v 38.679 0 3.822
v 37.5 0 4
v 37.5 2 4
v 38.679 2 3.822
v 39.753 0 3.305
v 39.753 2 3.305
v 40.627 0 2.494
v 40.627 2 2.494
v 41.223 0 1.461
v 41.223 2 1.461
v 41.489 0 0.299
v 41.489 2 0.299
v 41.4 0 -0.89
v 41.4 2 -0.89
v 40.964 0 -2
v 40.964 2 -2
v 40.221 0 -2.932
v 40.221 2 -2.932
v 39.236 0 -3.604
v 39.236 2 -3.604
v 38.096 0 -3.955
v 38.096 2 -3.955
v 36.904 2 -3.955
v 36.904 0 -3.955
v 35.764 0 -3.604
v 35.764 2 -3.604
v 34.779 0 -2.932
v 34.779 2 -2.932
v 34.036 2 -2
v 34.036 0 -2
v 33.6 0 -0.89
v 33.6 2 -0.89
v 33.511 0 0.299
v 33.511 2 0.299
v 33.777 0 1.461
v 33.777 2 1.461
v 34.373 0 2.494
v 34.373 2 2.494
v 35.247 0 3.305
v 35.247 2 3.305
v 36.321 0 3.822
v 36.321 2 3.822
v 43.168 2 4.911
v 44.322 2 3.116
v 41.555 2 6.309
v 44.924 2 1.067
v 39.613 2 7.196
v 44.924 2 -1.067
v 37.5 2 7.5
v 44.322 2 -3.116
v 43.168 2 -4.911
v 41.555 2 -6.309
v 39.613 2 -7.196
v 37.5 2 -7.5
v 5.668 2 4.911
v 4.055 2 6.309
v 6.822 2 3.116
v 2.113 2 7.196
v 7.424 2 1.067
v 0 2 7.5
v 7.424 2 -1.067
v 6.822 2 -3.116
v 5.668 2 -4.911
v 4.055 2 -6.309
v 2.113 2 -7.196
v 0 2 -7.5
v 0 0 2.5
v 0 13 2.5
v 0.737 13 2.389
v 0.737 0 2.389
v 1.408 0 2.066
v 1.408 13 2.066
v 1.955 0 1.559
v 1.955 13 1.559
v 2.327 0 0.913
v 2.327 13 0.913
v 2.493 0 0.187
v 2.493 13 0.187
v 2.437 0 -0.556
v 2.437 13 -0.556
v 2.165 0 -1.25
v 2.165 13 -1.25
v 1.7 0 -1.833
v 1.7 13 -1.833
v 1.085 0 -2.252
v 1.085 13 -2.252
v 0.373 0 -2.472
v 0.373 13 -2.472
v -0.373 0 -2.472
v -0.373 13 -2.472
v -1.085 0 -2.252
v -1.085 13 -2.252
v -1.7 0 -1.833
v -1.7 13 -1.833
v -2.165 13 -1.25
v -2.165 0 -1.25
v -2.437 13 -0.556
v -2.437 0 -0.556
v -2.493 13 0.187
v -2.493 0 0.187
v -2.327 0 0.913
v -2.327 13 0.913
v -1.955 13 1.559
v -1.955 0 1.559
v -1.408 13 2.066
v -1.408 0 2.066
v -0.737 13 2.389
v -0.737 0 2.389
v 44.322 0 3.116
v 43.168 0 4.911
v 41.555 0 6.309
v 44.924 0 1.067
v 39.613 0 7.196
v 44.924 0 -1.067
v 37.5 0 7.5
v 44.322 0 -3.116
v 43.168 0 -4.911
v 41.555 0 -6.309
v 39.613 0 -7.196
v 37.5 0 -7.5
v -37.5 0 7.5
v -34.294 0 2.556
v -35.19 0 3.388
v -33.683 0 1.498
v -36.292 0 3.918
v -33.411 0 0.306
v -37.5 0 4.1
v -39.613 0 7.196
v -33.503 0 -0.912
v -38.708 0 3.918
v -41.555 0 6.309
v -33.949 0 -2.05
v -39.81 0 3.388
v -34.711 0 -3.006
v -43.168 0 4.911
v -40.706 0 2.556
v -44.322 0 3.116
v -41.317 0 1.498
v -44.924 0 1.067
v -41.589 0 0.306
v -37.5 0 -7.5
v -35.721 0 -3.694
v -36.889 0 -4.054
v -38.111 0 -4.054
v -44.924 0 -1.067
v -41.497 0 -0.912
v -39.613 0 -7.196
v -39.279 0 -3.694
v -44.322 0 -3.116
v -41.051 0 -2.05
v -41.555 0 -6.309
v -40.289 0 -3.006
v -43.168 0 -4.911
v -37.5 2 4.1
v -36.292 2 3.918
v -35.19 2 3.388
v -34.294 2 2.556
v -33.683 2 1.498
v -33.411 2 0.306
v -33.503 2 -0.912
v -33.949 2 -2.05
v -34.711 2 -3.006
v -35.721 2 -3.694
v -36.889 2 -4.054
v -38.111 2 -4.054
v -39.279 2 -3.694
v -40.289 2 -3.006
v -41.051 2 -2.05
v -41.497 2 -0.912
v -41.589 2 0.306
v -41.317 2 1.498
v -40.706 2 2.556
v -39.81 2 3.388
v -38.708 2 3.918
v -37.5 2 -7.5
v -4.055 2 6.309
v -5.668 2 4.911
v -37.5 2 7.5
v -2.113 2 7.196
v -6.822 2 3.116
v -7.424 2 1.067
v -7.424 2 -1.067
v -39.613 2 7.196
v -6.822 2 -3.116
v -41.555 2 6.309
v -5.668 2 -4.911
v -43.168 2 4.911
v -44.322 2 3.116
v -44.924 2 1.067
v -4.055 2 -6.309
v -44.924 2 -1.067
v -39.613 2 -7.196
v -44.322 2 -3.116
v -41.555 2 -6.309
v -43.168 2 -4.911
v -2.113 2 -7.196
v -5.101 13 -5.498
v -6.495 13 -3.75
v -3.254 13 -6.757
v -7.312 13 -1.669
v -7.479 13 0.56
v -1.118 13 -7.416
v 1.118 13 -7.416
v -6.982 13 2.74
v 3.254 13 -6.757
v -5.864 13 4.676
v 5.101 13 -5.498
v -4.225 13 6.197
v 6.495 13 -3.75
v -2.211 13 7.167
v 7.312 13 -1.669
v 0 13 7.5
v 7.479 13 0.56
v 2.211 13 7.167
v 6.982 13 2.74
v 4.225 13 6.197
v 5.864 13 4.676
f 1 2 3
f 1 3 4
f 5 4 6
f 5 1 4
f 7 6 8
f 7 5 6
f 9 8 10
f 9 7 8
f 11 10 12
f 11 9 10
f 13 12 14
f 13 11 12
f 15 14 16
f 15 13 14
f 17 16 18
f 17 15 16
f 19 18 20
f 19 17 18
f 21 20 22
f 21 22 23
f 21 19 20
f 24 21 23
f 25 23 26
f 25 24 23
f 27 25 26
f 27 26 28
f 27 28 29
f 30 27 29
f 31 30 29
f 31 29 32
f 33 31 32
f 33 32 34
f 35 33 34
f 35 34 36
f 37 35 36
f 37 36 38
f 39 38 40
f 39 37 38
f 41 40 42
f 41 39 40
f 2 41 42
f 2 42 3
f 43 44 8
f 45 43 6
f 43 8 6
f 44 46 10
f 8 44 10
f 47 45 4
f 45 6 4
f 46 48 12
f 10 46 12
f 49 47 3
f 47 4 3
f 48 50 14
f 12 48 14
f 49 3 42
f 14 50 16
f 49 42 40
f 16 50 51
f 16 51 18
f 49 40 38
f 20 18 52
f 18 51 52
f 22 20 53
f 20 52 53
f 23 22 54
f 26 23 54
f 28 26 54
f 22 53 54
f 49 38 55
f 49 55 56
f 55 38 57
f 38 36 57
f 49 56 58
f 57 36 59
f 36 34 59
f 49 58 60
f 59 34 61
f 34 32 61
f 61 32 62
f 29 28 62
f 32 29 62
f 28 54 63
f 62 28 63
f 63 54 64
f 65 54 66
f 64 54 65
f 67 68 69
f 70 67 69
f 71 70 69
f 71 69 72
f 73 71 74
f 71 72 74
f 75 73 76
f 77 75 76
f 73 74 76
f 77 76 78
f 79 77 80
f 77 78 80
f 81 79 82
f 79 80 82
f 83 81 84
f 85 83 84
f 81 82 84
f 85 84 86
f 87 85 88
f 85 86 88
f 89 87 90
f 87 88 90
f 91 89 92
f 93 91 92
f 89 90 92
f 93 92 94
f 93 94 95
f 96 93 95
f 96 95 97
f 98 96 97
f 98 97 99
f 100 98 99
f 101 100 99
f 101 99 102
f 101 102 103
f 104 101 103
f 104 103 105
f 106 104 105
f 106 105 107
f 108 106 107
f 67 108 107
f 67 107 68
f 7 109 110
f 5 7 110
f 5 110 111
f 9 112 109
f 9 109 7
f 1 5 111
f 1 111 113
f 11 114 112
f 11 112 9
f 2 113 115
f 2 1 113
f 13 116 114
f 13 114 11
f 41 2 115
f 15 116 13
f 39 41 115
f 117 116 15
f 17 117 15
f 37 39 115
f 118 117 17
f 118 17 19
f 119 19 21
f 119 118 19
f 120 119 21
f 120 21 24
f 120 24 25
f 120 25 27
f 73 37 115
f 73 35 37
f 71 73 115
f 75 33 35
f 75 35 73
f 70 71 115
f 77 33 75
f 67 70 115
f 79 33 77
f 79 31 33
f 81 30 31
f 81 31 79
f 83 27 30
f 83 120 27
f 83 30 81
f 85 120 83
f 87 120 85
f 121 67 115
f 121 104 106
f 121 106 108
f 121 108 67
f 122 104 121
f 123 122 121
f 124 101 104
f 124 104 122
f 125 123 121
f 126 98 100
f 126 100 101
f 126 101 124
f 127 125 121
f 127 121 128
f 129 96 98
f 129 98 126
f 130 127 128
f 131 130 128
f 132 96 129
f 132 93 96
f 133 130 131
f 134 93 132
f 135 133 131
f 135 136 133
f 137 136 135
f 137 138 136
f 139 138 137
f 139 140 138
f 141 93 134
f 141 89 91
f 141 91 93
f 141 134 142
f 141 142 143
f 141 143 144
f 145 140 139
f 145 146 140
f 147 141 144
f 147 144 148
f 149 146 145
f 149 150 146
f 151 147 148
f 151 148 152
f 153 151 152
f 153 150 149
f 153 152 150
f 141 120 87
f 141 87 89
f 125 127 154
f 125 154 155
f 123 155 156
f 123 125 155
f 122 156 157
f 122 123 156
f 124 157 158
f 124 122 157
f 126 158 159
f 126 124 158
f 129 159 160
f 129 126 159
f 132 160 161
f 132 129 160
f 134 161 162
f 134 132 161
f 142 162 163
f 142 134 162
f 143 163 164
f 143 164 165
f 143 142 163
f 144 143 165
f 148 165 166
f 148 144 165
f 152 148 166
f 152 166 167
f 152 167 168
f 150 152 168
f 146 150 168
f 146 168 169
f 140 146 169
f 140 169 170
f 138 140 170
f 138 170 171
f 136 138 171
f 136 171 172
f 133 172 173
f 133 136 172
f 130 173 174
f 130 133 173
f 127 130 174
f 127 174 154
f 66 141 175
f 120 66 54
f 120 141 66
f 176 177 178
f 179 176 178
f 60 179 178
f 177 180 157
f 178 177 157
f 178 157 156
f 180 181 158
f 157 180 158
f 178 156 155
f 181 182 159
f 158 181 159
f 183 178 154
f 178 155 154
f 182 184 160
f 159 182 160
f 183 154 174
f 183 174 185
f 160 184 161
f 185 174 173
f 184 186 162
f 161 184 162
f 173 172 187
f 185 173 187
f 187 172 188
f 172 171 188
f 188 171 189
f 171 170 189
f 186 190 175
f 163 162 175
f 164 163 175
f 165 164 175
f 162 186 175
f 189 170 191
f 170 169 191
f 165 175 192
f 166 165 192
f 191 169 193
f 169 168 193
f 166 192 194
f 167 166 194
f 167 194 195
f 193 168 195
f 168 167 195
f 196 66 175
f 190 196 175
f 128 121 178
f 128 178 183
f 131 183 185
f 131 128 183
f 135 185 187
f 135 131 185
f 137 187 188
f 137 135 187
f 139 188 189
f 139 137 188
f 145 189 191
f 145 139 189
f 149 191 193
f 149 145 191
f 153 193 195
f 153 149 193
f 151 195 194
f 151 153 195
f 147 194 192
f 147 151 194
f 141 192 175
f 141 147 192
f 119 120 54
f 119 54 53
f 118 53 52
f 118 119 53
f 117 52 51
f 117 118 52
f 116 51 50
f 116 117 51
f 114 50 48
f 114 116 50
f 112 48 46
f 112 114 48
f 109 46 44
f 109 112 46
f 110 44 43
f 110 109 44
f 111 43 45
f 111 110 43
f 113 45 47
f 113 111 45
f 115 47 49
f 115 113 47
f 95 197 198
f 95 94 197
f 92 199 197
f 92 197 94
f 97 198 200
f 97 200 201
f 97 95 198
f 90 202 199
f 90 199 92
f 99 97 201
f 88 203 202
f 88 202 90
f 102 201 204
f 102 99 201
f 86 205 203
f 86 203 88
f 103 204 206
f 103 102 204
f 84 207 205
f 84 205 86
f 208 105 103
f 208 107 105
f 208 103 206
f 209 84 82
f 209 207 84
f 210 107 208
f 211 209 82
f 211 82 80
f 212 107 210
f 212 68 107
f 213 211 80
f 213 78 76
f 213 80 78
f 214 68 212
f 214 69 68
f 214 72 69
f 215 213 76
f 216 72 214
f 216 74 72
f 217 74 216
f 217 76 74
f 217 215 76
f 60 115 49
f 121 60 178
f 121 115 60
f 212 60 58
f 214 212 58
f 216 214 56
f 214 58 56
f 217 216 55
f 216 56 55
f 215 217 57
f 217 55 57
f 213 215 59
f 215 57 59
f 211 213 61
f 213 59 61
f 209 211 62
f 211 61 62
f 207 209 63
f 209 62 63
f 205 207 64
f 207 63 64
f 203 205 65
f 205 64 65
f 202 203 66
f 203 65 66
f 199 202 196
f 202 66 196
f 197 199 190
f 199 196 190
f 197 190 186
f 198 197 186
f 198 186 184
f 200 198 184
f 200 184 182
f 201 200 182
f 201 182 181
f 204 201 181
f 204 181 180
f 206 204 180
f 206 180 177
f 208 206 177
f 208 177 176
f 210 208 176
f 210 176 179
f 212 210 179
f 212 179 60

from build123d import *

# Parameters (mm, degrees)
SKETCH1_R           = 4.1
SKETCH1_R_2         = 4
BOSS_EXTRUDE1_DEPTH = 2
SKETCH3_R           = 7.5
BOSS_EXTRUDE3_DEPTH = 11
SKETCH4_R           = 2.5
CUT_EXTRUDE1_DEPTH  = 48.436800061


with BuildPart() as part:
    # Sketch1 → Boss-Extrude1 (new body)
    with BuildSketch(Plane(origin=(0, 0, 0), x_dir=(1, 0, 0), z_dir=(0, 1, 0))):
        with BuildLine():
            Line((-37.5, 7.5), (37.5, 7.5))
            ThreePointArc((37.5, 7.5), (45, 0), (37.5, -7.5))
            Line((37.5, -7.5), (-37.5, -7.5))
            ThreePointArc((-37.5, -7.5), (-45, 0), (-37.5, 7.5))
        make_face()
        with Locations(Location((-37.5, 0, 0), (0, 0, 270))):
            Circle(SKETCH1_R, mode=Mode.SUBTRACT)
        with Locations(Location((37.5, 0, 0), (0, 0, 270))):
            Circle(SKETCH1_R_2, mode=Mode.SUBTRACT)
    extrude(amount=BOSS_EXTRUDE1_DEPTH)

    # Sketch3 → Boss-Extrude3 (add)
    with BuildSketch(Plane(origin=(0, 2, 0), x_dir=(1, 0, 0), z_dir=(0, 1, 0))):
        with Locations(Location((0, 0, 0), (0, 0, 270))):
            Circle(SKETCH3_R)
    extrude(amount=BOSS_EXTRUDE3_DEPTH)

    # Sketch4 → Cut-Extrude1 (cut, through all)
    with BuildSketch(Plane(origin=(0, 13, 0), x_dir=(1, 0, 0), z_dir=(0, 1, 0))):
        with Locations(Location((0, 0, 0), (0, 0, 270))):
            Circle(SKETCH4_R)
    extrude(amount=-CUT_EXTRUDE1_DEPTH, mode=Mode.SUBTRACT)


solid = part.part
